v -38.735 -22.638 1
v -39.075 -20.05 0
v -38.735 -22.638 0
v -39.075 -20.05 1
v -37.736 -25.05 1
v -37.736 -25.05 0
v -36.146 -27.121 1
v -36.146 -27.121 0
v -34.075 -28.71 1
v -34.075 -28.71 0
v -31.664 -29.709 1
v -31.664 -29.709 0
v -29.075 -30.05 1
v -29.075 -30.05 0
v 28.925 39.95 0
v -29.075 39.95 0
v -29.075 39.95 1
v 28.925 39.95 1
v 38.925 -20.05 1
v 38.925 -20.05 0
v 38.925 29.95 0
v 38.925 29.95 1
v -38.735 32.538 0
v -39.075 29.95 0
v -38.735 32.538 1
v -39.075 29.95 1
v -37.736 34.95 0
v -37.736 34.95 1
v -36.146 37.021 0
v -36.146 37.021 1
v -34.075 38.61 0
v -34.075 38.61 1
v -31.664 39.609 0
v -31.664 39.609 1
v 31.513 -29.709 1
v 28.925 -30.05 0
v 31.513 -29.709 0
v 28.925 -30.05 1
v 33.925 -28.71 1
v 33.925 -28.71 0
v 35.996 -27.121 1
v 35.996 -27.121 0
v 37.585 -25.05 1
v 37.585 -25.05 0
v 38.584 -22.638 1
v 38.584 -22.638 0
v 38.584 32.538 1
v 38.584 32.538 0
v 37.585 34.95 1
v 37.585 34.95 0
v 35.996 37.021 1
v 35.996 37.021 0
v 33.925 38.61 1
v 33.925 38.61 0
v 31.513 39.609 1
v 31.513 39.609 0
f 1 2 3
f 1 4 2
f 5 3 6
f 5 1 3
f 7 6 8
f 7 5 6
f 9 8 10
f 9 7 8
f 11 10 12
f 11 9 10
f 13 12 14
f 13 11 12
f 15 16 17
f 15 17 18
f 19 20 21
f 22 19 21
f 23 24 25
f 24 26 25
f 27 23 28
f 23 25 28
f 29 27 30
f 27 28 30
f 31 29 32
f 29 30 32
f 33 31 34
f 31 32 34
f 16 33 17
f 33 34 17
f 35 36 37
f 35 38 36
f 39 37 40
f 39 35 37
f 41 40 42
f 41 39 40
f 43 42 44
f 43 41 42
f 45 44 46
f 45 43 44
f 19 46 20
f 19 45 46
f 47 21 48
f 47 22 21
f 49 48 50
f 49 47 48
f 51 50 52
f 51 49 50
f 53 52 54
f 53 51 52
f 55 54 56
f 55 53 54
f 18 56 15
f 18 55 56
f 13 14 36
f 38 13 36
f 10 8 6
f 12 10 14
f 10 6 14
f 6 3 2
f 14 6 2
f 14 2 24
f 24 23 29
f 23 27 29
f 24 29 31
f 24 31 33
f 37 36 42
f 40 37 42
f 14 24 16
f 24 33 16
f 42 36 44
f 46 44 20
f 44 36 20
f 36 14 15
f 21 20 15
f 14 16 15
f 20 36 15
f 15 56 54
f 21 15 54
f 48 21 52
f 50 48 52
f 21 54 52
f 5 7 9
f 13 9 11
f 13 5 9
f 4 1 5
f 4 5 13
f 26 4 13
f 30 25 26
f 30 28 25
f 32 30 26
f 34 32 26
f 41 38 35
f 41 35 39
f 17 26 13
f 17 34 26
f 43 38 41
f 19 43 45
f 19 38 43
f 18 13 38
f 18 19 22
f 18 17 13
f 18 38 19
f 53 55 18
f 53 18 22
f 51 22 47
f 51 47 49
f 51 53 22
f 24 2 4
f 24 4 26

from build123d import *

# Parameters (mm, degrees)
SKETCH1_W           = 78
SKETCH1_H           = 70
BOSS_EXTRUDE1_DEPTH = 1
FILLET1_R           = 10


with BuildPart() as part:
    # Sketch1 → Boss-Extrude1 (new body)
    with BuildSketch(Plane.XY):
        with Locations((-0.075399098, 4.950190099)):
            Rectangle(SKETCH1_W, SKETCH1_H)
    extrude(amount=BOSS_EXTRUDE1_DEPTH)

    # Fillet1
    fillet1_edges = [part.edges().sort_by_distance(p)[0] for p in [
        (38.924600902, -30.049809901, 0.5),
        (-39.075399098, -30.049809901, 0.5),
        (-39.075399098, 39.950190099, 0.5),
        (38.924600902, 39.950190099, 0.5),
    ]]
    fillet(fillet1_edges, radius=FILLET1_R)


solid = part.part
